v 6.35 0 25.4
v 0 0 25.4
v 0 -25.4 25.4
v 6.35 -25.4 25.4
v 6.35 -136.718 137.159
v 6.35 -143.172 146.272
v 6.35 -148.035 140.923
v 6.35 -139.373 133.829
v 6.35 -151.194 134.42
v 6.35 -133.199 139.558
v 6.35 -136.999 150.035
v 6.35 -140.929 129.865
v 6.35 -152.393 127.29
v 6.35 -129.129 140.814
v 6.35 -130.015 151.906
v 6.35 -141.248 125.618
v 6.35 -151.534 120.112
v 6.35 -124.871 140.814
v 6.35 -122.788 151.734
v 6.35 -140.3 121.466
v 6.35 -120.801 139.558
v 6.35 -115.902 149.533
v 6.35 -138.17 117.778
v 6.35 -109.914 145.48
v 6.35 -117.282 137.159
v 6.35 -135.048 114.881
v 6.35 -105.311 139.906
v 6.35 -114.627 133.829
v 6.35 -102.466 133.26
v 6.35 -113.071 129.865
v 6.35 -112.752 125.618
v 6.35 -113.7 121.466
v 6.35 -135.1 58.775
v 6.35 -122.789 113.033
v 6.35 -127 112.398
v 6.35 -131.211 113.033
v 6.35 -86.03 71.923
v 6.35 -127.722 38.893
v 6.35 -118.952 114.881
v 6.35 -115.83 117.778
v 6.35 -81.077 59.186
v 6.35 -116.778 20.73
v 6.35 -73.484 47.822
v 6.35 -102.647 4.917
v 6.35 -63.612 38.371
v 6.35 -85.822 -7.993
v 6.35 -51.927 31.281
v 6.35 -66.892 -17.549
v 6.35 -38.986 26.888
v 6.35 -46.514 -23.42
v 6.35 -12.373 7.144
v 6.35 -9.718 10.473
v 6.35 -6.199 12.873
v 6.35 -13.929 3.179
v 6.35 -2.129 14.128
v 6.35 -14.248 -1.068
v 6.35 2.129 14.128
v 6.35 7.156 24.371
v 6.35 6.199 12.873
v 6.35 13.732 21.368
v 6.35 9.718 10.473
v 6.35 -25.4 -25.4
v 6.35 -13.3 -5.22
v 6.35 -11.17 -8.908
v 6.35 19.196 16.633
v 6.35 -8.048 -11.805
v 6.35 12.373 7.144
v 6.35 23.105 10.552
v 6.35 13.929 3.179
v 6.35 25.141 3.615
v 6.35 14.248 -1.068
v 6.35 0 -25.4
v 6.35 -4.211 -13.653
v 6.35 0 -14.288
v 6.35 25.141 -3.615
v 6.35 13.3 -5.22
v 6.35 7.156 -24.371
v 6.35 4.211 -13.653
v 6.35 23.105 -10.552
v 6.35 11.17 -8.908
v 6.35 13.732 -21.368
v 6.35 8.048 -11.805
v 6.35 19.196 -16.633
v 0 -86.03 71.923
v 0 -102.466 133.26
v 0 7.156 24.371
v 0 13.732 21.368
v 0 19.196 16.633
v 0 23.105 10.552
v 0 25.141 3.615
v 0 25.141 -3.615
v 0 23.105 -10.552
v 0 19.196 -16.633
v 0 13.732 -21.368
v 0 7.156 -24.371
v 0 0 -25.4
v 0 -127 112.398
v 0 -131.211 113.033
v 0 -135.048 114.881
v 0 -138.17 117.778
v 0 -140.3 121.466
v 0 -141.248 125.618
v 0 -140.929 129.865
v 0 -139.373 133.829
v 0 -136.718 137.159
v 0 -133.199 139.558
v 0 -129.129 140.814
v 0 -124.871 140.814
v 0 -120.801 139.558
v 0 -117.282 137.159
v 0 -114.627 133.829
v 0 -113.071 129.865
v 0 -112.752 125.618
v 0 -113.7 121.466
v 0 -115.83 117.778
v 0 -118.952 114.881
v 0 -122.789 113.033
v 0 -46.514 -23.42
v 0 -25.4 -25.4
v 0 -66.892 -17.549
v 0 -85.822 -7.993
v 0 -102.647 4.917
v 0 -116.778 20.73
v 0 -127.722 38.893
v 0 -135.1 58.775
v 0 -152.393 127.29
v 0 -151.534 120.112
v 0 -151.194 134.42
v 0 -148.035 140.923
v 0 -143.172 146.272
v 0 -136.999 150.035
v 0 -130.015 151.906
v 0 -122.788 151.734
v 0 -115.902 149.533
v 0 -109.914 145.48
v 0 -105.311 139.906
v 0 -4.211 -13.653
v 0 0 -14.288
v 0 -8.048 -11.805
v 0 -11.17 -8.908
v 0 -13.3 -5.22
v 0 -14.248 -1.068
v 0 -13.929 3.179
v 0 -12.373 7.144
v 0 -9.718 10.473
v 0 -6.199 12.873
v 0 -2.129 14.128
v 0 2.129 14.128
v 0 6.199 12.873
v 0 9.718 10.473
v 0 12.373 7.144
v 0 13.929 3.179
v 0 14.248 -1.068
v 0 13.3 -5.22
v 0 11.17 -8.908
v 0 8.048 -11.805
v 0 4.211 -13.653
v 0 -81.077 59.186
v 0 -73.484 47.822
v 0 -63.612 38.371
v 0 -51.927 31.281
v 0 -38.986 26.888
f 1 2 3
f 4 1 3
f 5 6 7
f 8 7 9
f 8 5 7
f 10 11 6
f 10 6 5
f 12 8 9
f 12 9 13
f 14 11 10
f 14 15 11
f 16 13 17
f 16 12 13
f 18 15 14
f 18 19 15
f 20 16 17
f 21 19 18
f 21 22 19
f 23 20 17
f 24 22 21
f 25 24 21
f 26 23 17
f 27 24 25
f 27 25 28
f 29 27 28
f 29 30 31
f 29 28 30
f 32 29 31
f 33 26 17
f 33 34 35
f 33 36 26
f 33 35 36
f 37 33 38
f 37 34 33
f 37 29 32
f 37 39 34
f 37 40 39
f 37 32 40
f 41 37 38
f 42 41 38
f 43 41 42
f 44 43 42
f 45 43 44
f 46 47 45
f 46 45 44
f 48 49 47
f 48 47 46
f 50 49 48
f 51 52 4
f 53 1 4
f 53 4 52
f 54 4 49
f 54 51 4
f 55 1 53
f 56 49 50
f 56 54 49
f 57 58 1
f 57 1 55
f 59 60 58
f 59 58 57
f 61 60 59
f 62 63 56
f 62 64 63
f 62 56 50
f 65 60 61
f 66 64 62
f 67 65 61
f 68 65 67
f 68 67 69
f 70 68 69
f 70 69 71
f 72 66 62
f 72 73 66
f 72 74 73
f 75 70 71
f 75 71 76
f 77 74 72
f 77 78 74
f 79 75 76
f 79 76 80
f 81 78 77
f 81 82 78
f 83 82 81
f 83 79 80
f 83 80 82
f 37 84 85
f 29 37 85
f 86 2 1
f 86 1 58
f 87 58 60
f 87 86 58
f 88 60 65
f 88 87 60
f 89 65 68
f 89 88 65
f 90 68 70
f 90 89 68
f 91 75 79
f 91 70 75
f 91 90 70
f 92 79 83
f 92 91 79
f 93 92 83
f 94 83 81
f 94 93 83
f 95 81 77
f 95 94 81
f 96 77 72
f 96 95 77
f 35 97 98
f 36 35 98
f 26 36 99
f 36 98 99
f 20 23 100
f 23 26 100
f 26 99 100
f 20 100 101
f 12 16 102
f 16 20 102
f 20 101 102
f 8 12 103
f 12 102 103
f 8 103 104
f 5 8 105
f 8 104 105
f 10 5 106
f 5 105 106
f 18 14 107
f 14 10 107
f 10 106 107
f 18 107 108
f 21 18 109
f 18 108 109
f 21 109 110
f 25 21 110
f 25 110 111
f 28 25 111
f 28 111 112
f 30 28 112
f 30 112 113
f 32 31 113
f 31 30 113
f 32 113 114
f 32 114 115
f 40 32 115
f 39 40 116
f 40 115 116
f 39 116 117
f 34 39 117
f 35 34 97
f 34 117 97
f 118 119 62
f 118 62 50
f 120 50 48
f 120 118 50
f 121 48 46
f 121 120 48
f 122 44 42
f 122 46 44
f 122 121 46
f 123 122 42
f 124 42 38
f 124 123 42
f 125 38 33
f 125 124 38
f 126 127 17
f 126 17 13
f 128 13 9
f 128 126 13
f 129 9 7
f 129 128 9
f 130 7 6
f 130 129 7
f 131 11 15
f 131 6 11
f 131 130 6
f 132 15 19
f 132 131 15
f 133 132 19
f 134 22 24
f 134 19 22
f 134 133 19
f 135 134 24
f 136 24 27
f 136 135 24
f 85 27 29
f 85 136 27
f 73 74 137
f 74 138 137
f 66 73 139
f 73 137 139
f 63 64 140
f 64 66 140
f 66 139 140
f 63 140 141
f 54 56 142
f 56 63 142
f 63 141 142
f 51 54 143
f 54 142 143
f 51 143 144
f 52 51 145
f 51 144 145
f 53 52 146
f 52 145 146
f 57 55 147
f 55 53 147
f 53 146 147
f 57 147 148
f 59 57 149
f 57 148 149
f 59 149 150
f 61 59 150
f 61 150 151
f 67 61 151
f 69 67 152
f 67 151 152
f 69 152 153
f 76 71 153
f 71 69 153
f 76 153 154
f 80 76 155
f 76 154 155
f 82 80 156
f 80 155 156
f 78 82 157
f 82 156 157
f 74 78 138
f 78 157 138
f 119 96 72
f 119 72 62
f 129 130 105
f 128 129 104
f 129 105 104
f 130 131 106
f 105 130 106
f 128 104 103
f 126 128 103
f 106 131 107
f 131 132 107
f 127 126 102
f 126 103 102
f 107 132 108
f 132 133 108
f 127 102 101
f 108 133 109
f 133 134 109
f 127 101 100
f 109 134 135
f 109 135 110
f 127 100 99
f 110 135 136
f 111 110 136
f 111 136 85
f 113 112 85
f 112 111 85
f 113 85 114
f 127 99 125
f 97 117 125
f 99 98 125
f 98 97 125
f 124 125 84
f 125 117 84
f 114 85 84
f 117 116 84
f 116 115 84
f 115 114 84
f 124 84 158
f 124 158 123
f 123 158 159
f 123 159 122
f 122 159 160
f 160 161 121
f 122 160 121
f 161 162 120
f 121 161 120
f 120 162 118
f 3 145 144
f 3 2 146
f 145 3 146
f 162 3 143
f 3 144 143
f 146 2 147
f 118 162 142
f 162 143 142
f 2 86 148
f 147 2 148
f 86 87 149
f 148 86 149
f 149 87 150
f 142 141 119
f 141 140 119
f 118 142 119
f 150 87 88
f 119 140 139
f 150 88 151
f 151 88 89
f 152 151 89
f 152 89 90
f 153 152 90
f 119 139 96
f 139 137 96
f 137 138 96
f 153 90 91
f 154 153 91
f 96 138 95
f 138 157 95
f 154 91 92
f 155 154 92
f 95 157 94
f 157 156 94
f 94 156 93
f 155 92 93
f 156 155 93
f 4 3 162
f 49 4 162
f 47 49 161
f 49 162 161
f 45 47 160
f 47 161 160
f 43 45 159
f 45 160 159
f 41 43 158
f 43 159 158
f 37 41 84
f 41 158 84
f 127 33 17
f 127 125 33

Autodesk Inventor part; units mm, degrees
ref_plane "YZ Plane" through (0, 0, 0) normal (1, 0, 0) x (0, 1, 0)
ref_plane "XZ Plane" through (0, 0, 0) normal (0, 1, 0) x (-1, 0, 0)
ref_plane "XY Plane" through (0, 0, 0) normal (0, 0, 1) x (1, 0, 0)
sketch "Sketch2" plane through (0, 0, 0) normal (1, 0, 0) x (0, 0, -1)
  circle A0 centre (0, 0) radius 14.2875
  arc A1 (25.4, 0) -> (-25.4, 0) centre (0, 0) ccw
  line L0 (-25.4, 0) -> (-25.4, -25.4)
  line L1 (25.4, 0) -> (25.4, -25.4)
  arc A2 (-71.9234, -86.0305) -> (-25.4, -25.4) centre (-88.1693, -25.4) ccw
  arc A3 (-58.7754, -135.0995) -> (25.4, -25.4) centre (-88.1693, -25.4) ccw
  line L2 (-88.1693, -25.4) -> (-58.7754, -135.0995) construction
  line L3 (-71.9234, -86.0305) -> (-133.2597, -102.4655)
  line L4 (-58.7754, -135.0995) -> (-120.1117, -151.5345)
  arc A4 (-133.2597, -102.4655) -> (-120.1117, -151.5345) centre (-126.6857, -127) ccw
  circle A5 centre (-126.6857, -127) radius 14.2875
  line L5 (-88.1693, -25.4) -> (25.4, -25.4) construction
  dimension "d0" = 28.575
  dimension "d1" = 25.4
  dimension "d2" = 28.575
  dimension "d3" = 25.4
  dimension "d4" = 63.5
  dimension "d5" = 127
  dimension "d6" = 75
extrude "Extrusion1" add sketch "Sketch2" along normal blind 6.35
properties part number "Claw"
